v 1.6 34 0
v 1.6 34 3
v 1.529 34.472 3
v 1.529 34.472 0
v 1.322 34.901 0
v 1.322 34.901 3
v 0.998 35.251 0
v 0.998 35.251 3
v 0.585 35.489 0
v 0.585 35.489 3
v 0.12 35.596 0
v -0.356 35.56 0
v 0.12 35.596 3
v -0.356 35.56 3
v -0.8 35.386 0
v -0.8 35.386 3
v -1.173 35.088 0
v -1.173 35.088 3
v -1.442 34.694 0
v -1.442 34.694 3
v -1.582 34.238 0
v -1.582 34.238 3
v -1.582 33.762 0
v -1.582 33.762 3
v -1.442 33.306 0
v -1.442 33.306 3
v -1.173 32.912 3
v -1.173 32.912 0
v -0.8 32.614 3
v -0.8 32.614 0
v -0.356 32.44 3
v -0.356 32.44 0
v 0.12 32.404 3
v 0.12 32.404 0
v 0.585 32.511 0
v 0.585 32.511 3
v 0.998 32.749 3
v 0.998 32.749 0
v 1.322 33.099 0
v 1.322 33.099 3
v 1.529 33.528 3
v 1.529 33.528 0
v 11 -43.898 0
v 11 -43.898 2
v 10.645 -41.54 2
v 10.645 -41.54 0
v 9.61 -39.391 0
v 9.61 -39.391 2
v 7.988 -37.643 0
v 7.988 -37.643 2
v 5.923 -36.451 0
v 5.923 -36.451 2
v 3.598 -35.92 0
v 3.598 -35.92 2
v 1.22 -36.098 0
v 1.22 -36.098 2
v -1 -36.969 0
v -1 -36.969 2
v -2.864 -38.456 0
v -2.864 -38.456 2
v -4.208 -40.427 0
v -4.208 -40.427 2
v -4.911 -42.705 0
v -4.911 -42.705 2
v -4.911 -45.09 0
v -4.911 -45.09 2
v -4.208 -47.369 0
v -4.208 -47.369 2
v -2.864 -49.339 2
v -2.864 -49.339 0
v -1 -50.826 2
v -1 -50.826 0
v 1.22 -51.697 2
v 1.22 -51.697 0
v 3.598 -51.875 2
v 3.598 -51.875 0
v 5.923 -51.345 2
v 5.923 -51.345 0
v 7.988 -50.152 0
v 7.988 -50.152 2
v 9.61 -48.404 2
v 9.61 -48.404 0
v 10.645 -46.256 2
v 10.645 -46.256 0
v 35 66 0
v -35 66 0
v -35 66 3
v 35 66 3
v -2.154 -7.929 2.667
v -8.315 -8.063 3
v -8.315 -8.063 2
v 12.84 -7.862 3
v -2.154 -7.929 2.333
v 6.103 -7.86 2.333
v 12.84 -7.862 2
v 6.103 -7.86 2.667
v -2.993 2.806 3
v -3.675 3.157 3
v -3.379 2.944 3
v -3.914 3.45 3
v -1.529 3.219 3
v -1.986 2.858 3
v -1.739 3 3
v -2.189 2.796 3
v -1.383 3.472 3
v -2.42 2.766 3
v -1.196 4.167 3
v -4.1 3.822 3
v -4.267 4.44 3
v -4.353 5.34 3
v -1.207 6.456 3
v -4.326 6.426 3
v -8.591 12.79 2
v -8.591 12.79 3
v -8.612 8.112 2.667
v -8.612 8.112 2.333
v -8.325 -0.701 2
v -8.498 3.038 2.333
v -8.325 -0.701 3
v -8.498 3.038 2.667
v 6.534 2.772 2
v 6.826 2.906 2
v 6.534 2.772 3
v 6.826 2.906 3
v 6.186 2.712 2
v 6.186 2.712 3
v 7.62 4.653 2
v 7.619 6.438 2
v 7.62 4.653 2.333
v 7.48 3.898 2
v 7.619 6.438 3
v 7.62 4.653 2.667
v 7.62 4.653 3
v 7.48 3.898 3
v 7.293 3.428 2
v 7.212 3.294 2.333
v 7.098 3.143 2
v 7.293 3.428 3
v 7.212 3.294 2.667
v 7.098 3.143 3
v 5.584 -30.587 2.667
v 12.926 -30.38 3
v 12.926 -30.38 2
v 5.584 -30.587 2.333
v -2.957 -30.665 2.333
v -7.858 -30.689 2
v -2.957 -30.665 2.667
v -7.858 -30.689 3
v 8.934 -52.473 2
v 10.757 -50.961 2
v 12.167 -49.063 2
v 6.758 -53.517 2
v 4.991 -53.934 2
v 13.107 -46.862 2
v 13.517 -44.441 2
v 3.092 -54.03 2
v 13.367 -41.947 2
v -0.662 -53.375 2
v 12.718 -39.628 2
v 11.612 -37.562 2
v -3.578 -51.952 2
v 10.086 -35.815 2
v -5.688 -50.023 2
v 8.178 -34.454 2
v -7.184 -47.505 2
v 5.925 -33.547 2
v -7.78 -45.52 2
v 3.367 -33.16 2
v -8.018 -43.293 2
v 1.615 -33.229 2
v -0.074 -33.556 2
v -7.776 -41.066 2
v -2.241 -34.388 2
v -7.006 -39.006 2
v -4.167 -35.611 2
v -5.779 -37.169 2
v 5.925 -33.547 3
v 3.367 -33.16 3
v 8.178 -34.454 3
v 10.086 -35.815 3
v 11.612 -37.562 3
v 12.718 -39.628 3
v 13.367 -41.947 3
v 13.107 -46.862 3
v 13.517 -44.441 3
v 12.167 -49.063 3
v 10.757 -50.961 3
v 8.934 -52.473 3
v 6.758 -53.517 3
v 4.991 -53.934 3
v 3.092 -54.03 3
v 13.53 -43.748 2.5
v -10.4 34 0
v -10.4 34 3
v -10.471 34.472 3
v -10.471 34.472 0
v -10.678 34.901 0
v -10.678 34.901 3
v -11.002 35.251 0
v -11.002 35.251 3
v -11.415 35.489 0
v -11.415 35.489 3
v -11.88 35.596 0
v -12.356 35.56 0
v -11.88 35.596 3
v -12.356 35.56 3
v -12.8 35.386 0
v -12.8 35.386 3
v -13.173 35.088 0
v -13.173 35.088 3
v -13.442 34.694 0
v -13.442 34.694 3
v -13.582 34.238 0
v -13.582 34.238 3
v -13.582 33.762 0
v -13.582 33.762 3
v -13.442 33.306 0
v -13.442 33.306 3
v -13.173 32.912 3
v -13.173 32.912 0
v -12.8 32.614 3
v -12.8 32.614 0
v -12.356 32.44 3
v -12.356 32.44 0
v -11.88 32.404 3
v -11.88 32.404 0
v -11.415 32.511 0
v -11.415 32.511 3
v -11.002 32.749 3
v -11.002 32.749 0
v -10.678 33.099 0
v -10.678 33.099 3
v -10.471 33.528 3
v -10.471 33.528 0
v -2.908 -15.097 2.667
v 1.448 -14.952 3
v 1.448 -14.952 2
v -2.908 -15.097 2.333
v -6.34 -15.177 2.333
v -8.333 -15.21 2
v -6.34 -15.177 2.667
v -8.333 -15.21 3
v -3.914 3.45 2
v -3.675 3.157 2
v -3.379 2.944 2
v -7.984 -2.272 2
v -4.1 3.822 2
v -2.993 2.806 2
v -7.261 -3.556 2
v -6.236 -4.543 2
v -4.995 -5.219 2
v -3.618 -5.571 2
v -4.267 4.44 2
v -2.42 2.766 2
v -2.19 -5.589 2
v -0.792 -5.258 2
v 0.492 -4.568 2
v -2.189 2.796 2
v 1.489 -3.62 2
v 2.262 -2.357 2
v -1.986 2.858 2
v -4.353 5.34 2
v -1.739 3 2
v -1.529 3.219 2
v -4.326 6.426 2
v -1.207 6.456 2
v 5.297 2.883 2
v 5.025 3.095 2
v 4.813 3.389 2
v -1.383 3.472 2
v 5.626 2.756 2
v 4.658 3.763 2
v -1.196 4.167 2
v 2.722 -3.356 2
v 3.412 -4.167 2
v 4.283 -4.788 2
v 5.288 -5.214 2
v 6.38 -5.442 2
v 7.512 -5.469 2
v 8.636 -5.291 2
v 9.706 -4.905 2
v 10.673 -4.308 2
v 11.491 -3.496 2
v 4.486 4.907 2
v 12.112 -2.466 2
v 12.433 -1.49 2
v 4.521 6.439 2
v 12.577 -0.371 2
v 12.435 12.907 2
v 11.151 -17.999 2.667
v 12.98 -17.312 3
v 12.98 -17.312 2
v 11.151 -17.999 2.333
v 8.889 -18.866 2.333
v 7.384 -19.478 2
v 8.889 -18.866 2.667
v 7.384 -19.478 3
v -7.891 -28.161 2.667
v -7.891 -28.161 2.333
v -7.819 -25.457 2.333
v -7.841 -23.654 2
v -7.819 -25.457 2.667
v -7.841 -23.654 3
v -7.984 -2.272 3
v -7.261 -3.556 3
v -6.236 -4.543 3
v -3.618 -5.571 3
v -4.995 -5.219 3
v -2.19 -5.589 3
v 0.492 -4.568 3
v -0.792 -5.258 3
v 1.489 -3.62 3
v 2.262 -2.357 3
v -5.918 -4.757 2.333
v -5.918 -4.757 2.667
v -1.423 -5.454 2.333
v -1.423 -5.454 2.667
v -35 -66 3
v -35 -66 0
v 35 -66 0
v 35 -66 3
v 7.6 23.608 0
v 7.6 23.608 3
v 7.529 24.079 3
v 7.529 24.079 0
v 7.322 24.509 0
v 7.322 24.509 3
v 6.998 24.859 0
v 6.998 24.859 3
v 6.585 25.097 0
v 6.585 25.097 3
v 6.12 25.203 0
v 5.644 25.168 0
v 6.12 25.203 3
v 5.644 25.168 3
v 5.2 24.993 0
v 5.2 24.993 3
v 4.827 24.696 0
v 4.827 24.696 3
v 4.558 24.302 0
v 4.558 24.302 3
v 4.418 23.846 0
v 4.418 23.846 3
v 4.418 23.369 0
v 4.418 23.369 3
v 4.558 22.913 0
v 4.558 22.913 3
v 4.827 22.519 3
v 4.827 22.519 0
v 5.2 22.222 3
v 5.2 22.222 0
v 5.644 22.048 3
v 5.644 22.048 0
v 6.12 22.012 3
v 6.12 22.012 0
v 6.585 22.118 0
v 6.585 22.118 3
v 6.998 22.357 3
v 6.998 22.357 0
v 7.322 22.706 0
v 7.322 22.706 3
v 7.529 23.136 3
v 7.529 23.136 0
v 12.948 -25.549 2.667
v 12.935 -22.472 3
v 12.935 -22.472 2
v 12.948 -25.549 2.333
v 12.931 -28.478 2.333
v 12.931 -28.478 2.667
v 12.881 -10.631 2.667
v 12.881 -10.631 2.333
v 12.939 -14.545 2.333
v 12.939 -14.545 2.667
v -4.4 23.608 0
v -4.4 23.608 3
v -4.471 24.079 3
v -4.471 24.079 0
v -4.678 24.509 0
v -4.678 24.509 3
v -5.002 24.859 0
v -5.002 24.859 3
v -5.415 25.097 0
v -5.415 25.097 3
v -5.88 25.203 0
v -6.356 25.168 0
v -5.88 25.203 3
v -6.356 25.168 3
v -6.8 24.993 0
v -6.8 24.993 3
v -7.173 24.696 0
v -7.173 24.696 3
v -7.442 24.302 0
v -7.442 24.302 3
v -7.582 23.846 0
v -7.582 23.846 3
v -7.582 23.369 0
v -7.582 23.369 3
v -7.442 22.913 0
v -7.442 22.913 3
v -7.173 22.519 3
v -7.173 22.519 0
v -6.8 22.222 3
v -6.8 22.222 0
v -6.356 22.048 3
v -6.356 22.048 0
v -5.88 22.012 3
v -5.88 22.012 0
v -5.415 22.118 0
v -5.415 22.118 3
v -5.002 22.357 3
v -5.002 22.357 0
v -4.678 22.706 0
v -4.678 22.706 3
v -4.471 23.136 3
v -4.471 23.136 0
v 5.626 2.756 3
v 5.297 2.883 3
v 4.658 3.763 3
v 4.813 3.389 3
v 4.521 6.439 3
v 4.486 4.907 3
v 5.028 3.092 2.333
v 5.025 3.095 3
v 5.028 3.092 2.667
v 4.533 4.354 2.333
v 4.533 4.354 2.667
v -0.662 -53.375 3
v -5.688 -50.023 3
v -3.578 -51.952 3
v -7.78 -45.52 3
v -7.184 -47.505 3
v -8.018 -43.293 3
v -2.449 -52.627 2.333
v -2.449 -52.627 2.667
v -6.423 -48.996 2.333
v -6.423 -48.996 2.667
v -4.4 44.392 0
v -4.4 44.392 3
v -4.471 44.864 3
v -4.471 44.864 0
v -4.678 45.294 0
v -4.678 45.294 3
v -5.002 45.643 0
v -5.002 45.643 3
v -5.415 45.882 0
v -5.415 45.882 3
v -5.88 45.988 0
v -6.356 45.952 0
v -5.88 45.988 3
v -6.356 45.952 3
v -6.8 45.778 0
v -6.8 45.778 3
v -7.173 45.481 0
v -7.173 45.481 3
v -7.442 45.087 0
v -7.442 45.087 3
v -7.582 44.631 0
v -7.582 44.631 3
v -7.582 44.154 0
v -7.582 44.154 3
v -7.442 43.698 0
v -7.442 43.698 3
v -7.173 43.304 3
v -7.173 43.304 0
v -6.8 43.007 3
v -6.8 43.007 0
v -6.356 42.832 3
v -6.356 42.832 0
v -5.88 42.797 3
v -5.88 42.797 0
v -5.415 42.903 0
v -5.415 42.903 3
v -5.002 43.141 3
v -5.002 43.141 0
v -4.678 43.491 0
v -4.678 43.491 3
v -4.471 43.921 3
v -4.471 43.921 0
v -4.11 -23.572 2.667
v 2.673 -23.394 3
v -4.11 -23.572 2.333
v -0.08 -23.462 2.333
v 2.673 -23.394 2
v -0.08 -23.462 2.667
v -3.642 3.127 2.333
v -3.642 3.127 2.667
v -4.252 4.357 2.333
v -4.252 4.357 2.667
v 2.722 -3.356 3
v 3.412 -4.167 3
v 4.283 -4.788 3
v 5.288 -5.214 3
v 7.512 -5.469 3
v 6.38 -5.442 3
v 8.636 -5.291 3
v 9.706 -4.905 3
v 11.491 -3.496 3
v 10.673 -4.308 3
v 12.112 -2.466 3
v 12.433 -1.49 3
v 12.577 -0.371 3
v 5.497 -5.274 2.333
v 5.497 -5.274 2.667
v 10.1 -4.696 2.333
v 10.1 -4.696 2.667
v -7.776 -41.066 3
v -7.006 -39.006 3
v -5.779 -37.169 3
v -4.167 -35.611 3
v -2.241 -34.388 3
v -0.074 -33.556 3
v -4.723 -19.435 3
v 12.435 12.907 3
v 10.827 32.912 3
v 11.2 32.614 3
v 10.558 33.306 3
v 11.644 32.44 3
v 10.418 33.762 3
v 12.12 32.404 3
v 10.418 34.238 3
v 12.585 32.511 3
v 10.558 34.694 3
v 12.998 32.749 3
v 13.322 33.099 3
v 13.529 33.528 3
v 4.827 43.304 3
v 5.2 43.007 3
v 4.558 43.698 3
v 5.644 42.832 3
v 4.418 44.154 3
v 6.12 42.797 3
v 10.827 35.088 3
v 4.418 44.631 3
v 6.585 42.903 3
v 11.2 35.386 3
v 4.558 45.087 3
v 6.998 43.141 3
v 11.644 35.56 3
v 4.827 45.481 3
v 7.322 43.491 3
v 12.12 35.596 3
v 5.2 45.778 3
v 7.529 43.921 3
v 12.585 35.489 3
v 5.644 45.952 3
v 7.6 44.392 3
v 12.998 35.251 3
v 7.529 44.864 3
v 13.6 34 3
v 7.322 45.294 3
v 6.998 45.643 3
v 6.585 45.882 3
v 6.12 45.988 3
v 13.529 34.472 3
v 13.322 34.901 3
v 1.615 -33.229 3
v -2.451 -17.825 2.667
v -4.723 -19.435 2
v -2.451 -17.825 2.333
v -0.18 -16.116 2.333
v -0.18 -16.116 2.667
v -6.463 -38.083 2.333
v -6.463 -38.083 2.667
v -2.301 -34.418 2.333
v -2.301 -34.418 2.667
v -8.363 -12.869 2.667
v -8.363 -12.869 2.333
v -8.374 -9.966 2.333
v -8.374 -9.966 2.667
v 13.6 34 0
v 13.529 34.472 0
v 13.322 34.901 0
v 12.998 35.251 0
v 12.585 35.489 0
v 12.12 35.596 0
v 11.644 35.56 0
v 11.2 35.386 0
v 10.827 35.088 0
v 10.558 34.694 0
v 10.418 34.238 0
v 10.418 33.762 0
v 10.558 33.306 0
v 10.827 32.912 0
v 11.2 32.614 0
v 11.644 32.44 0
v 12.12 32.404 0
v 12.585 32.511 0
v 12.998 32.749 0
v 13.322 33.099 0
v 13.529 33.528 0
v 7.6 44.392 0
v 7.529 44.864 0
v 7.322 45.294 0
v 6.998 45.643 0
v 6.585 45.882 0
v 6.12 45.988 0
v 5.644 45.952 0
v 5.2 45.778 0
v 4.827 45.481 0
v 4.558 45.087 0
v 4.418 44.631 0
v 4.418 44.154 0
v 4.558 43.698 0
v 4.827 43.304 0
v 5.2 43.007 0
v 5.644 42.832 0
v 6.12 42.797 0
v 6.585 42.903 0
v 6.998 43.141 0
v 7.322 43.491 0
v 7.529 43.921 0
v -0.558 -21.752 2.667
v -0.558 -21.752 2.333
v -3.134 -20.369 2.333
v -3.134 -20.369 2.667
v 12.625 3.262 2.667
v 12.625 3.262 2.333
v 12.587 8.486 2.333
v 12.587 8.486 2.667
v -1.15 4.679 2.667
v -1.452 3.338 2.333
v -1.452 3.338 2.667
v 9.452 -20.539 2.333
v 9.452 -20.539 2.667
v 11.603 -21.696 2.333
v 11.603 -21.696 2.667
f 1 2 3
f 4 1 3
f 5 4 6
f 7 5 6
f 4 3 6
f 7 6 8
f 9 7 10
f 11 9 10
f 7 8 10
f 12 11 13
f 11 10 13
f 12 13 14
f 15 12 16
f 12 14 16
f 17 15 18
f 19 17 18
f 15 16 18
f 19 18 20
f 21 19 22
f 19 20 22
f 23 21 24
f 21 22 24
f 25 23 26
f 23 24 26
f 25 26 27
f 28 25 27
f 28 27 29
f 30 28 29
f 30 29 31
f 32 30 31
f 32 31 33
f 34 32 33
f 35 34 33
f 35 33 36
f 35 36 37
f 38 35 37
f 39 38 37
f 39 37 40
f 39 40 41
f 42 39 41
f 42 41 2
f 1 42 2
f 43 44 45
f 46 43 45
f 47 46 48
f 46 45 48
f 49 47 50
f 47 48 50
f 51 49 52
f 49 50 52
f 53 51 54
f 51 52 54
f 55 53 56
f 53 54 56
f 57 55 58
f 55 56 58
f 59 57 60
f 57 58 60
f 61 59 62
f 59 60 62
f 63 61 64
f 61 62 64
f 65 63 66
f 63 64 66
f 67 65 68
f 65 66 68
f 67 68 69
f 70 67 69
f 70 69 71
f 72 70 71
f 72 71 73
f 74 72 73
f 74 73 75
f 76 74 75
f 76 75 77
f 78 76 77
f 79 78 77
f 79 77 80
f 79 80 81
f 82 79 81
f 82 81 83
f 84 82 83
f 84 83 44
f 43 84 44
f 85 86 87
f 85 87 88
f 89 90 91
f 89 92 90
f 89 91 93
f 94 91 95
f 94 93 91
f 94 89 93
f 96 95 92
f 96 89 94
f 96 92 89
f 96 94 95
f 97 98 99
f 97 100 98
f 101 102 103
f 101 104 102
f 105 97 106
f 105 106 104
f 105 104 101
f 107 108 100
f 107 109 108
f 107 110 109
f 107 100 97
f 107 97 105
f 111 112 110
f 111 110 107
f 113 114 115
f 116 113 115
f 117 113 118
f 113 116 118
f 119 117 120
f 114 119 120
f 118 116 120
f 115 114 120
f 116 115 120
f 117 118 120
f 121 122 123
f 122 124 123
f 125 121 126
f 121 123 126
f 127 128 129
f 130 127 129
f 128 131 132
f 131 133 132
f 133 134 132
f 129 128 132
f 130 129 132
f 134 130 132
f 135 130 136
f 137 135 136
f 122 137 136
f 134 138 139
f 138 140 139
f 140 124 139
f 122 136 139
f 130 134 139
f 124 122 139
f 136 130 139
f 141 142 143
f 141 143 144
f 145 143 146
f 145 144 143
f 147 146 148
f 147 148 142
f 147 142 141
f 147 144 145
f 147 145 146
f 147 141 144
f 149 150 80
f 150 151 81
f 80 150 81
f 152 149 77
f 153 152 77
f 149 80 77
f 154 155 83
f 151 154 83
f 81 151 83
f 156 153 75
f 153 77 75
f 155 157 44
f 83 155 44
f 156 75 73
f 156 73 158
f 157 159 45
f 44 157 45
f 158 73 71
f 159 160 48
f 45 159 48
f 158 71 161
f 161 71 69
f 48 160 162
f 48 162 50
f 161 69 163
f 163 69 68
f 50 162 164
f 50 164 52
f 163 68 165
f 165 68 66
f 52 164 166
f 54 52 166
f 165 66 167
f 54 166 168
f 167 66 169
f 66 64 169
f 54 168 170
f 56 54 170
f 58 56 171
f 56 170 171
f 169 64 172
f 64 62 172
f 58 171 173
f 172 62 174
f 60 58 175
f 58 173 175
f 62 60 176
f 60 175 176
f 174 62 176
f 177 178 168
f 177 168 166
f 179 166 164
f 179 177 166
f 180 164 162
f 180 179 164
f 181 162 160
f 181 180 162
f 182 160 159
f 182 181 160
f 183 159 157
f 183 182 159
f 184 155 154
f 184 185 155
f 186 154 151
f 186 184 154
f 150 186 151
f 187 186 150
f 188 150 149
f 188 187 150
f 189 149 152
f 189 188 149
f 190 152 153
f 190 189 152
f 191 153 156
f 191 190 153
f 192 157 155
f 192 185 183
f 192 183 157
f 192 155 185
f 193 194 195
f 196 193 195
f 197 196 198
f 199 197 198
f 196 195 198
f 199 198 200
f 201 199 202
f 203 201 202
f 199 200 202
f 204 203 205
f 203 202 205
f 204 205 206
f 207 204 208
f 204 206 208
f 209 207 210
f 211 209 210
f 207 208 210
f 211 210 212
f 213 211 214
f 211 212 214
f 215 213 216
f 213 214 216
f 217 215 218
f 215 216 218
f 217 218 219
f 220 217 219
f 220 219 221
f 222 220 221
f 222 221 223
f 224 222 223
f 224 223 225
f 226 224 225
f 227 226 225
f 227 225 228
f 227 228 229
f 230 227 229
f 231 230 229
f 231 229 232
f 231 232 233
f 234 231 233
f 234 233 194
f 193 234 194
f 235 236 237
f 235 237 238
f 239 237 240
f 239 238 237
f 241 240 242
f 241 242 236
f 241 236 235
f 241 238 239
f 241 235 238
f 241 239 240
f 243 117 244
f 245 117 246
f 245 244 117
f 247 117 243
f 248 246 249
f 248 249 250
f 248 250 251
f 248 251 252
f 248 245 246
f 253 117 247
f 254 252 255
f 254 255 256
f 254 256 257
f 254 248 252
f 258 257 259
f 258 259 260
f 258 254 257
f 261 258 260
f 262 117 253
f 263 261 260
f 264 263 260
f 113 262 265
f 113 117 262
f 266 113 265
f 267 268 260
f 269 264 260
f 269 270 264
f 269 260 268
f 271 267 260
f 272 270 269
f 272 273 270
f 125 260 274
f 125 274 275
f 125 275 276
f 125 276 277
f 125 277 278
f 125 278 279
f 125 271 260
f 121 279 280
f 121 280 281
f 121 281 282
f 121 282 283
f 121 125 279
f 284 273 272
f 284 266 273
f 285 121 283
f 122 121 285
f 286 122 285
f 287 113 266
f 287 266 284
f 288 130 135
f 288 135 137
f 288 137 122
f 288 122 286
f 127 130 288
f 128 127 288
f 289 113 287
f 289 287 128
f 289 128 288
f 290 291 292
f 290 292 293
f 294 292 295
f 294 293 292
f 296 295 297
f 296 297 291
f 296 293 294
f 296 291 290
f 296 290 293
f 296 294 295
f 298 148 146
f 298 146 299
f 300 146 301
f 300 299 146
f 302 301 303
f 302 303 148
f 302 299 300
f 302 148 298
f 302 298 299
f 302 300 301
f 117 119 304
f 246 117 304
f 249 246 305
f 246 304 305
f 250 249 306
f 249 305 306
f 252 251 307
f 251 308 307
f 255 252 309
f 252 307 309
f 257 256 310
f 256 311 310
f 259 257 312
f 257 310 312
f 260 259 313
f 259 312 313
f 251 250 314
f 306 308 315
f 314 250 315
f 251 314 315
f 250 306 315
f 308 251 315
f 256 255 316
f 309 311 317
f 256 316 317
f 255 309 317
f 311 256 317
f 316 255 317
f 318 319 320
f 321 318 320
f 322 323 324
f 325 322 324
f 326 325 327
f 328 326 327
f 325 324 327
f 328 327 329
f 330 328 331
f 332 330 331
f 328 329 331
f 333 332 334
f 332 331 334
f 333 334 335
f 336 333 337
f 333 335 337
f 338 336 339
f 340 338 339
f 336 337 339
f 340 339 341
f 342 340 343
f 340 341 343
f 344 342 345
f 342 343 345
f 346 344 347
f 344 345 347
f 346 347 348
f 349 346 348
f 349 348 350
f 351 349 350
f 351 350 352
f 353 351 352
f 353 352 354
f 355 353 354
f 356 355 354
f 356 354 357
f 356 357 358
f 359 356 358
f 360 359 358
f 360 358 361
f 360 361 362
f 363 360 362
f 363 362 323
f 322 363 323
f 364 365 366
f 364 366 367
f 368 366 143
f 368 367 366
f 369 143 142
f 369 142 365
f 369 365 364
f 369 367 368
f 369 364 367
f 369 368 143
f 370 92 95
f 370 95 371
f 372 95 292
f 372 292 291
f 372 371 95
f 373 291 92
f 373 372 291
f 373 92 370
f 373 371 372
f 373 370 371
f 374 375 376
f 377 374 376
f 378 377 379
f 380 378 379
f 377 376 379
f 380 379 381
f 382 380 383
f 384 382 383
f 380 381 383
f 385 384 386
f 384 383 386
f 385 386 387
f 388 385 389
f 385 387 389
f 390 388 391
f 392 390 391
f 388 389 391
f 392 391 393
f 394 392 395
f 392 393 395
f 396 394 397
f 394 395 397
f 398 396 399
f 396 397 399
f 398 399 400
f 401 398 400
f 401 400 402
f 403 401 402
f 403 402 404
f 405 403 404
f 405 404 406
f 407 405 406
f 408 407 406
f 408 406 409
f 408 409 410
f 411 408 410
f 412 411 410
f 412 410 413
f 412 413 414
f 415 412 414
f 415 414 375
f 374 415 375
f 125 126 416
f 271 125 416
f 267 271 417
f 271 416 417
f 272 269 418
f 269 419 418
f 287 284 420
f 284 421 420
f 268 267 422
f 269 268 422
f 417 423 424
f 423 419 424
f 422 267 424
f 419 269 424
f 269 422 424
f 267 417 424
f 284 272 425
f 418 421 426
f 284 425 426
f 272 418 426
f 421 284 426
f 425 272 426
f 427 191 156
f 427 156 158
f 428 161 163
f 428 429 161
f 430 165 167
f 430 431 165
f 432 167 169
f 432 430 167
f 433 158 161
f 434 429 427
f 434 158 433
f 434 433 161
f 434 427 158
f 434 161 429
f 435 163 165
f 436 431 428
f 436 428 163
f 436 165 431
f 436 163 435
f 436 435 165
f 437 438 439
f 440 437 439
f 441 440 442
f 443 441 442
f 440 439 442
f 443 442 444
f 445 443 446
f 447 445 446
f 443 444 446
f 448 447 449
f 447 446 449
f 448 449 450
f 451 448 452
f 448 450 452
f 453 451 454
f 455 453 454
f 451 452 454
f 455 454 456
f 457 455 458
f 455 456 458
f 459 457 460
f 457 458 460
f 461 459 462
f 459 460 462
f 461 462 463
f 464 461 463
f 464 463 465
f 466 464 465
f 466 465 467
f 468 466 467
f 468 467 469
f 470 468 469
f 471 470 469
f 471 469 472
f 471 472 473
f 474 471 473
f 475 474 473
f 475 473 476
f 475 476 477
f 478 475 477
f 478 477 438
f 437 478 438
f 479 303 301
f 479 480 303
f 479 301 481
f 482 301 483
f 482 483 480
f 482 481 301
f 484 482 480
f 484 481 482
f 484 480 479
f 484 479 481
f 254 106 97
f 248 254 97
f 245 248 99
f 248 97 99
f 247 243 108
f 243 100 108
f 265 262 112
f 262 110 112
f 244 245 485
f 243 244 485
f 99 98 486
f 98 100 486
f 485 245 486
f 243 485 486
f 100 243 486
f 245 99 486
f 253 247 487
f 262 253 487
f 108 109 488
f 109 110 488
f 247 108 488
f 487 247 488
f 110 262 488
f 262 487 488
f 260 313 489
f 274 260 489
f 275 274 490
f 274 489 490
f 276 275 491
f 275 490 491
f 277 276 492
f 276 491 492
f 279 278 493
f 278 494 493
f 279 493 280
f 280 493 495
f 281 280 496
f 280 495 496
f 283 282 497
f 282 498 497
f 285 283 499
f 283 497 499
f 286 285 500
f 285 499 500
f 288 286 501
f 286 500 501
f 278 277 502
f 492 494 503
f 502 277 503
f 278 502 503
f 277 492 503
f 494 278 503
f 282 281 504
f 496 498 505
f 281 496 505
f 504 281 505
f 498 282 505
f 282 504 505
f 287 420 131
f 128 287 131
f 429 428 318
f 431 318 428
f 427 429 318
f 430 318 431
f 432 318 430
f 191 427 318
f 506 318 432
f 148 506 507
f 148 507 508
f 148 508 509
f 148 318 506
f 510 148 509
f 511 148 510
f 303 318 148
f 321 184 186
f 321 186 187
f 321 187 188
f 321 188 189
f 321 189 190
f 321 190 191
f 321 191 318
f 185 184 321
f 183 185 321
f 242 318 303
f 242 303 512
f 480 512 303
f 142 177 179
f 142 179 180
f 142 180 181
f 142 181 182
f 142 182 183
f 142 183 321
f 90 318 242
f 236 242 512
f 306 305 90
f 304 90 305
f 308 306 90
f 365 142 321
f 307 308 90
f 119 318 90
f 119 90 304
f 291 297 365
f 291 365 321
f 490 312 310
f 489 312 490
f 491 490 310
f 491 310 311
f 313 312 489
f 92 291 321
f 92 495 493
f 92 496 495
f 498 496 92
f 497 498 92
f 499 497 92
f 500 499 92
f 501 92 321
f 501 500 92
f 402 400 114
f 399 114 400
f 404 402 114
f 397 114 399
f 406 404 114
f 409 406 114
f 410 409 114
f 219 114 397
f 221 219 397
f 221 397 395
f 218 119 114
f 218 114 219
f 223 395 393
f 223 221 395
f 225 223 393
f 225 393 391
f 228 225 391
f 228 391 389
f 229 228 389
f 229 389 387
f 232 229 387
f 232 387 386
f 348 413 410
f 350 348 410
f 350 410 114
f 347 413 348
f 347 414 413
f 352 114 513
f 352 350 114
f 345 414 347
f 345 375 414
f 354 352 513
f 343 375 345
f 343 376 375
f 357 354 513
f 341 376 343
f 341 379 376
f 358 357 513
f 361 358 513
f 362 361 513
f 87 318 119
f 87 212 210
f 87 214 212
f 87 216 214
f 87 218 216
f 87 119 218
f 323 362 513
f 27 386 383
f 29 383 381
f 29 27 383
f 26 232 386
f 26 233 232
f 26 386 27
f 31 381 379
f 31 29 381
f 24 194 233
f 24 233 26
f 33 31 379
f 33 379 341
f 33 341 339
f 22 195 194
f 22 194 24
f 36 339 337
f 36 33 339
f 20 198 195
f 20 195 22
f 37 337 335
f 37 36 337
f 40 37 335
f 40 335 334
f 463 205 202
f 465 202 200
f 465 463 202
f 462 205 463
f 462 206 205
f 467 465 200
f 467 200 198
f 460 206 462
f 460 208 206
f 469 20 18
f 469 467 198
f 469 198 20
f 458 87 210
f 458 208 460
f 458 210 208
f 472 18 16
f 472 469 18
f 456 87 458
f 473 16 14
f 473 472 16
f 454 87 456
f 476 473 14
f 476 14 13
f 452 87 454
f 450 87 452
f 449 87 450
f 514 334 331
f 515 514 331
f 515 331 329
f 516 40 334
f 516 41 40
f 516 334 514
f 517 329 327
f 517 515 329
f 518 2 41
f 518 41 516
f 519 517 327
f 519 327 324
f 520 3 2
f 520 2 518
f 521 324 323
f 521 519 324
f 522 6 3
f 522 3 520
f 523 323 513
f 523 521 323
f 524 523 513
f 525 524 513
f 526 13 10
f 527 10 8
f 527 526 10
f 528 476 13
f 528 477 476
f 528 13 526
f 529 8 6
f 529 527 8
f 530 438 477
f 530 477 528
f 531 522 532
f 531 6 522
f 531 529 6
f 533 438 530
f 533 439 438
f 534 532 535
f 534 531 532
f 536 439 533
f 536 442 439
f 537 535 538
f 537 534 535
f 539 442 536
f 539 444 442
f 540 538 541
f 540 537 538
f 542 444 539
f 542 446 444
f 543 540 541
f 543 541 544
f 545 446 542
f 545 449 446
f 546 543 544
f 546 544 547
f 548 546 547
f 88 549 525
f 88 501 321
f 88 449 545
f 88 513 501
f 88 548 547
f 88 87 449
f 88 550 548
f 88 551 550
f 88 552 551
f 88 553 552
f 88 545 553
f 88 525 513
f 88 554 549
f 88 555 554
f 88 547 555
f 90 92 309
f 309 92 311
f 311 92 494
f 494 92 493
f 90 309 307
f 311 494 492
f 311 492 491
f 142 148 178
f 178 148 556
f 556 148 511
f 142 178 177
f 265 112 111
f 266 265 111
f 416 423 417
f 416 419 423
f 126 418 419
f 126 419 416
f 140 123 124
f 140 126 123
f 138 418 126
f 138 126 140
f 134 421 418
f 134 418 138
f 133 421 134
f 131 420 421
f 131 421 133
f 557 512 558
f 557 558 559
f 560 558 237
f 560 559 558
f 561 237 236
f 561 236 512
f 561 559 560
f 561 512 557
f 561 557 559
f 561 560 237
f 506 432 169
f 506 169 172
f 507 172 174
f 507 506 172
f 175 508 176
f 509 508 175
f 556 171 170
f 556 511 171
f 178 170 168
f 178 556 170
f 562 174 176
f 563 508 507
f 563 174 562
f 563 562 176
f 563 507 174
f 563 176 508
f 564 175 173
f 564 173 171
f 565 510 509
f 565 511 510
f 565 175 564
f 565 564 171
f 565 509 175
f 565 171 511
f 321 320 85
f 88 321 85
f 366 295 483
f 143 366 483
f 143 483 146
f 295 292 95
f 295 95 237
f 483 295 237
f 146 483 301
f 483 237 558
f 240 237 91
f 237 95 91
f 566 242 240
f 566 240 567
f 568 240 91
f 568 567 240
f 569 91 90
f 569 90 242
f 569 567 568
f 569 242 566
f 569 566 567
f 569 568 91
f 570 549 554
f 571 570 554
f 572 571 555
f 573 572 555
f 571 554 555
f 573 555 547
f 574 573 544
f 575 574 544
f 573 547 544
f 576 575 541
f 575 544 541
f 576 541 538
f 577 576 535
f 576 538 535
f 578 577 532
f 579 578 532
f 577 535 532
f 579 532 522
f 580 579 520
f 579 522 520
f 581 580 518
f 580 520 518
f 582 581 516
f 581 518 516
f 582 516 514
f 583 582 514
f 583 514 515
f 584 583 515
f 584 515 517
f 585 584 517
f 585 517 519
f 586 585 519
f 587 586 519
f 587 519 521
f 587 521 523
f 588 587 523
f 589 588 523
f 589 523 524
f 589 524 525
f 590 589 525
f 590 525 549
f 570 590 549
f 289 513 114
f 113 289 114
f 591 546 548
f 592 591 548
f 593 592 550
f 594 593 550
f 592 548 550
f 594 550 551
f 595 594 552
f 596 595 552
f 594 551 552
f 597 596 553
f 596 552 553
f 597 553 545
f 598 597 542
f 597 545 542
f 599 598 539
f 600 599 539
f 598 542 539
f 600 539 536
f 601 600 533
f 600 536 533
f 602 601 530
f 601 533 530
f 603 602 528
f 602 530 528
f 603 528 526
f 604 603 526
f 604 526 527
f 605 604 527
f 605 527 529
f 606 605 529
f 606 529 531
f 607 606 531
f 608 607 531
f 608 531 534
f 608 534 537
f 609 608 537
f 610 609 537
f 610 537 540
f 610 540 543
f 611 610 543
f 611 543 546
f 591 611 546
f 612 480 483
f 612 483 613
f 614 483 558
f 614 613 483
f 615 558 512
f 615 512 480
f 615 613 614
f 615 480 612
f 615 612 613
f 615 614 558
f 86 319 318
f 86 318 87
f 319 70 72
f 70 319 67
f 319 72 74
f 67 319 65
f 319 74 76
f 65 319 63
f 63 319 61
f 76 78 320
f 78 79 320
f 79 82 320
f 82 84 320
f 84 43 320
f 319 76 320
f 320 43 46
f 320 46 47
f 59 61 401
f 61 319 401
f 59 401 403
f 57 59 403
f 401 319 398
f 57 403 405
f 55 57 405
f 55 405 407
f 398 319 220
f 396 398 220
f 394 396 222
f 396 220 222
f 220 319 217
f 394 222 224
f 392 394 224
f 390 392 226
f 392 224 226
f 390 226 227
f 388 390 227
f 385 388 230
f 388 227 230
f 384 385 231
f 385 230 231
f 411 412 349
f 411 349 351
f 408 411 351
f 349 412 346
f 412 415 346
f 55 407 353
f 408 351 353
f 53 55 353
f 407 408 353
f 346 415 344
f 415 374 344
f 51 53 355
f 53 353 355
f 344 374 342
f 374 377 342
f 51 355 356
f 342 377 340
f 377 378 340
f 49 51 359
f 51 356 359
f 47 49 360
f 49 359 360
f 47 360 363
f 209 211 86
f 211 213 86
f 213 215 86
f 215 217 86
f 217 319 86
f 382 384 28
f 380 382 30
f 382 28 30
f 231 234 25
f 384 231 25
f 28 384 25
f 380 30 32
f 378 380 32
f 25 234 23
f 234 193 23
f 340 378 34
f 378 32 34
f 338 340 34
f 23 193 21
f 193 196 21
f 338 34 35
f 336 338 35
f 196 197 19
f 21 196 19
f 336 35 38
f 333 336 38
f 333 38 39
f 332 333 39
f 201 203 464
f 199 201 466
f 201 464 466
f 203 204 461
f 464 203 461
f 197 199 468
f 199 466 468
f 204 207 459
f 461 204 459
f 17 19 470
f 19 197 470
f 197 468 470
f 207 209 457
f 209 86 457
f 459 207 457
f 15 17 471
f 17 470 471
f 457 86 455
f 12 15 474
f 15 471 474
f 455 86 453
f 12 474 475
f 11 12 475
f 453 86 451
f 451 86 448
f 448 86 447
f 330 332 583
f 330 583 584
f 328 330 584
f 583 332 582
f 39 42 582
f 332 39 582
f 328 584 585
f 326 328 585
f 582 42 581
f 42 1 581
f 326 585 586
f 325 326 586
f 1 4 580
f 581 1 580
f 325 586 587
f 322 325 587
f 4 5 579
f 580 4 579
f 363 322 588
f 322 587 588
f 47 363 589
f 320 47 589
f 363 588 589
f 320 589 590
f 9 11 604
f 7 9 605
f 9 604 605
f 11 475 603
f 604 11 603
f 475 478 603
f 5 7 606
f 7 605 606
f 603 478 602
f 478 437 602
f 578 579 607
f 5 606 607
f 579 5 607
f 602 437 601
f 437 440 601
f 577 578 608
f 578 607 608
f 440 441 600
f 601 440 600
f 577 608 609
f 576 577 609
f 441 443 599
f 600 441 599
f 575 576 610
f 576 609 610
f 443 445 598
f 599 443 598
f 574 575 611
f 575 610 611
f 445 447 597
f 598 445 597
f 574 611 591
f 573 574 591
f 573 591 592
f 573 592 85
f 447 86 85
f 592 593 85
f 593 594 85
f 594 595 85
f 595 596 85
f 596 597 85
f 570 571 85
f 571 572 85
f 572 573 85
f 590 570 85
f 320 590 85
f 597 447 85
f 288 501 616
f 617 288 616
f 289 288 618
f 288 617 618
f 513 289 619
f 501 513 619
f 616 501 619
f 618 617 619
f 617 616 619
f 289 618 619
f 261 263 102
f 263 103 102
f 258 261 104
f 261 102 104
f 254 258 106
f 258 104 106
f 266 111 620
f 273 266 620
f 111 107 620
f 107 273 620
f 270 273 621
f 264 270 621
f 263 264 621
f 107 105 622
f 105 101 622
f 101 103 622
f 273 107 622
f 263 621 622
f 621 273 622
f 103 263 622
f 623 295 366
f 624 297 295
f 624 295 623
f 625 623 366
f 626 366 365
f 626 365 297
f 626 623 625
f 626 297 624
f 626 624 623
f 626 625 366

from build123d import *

# Parameters (mm, degrees)
SKETCH1_W           = 70
SKETCH1_H           = 132
BOSS_EXTRUDE1_DEPTH = 3
SKETCH2_R           = 1.6
SKETCH2_R_2         = 8
CUT_EXTRUDE1_DEPTH  = 75.76630257
CUT_EXTRUDE4_DEPTH  = 1


with BuildPart() as part:
    # Sketch1 → Boss-Extrude1 (new body)
    with BuildSketch(Plane.XY):
        Rectangle(SKETCH1_W, SKETCH1_H)
    extrude(amount=BOSS_EXTRUDE1_DEPTH)

    # Sketch2 → Cut-Extrude1 (cut, through all)
    with BuildSketch(Plane.XY.offset(3)):
        with Locations((0, 34)):
            Circle(SKETCH2_R)
        with Locations((12, 34)):
            Circle(SKETCH2_R)
        with Locations((6, 23.607695155)):
            Circle(SKETCH2_R)
        with Locations((-6, 23.607695155)):
            Circle(SKETCH2_R)
        with Locations((-12, 34)):
            Circle(SKETCH2_R)
        with Locations((-6, 44.392304845)):
            Circle(SKETCH2_R)
        with Locations((6, 44.392304845)):
            Circle(SKETCH2_R)
        with Locations((3, -43.897608135)):
            Circle(SKETCH2_R_2)
    extrude(amount=-CUT_EXTRUDE1_DEPTH, mode=Mode.SUBTRACT)

    # Sketch4 → Cut-Extrude4 (cut)
    # profile 1 of 3: a face of its own
    with BuildSketch(Plane.XY.offset(3)):
        with BuildLine():
            Line((12.435373561, 12.906743281), (-8.591322356, 12.79048604))
            add(Edge.make_bspline(
                [(-8.591322356, 12.79048604), (-8.704286114, 8.885776406), (-8.502594221, 1.79384743), (-8.325007333, -0.700797834)],
                knots=[3, 3, 3, 3, 4, 4, 4, 4], degree=3))
            add(Edge.make_bspline(
                [(-8.325007333, -0.700797834), (-7.927810309, -6.293112042), (-0.051557809, -7.493806409), (2.262018013, -2.357422472)],
                knots=[4, 4, 4, 4, 5, 5, 5, 5], degree=3))
            add(Edge.make_bspline(
                [(2.262018013, -2.357422472), (3.647515819, -6.937264415), (12.328667278, -6.654110228), (12.577245481, -0.371389262)],
                knots=[0, 0, 0, 0, 1, 1, 1, 1], degree=3))
            add(Edge.make_bspline(
                [(12.577245481, -0.371389262), (12.657220975, 1.669518266), (12.654067782, 9.68502366), (12.435373561, 12.906743281)],
                knots=[1, 1, 1, 1, 2, 2, 2, 2], degree=3))
        make_face()
        with BuildLine():
            Line((-4.326492155, 6.425883244), (-1.206711683, 6.455631236))
            add(Edge.make_bspline(
                [(-1.206711683, 6.455631236), (-1.074026475, 4.572236089), (-1.015280968, 2.842101206), (-2.419907538, 2.766134029)],
                knots=[1, 1, 1, 1, 2, 2, 2, 2], degree=3))
            add(Edge.make_bspline(
                [(-2.419907538, 2.766134029), (-3.973264085, 2.682447476), (-4.493703991, 3.948173451), (-4.326492155, 6.425883244)],
                knots=[2, 2, 2, 2, 3, 3, 3, 3], degree=3))
        make_face(mode=Mode.SUBTRACT)
        with BuildLine():
            Line((4.521297604, 6.43862815), (7.619481633, 6.437735553))
            add(Edge.make_bspline(
                [(7.619481633, 6.437735553), (7.754881729, 4.557137064), (7.590941128, 2.787865388), (6.186314558, 2.711898211)],
                knots=[1, 1, 1, 1, 2, 2, 2, 2], degree=3))
            add(Edge.make_bspline(
                [(6.186314558, 2.711898211), (4.635672899, 2.631008317), (4.351289109, 3.963633245), (4.521297604, 6.43862815)],
                knots=[2, 2, 2, 2, 3, 3, 3, 3], degree=3))
        make_face(mode=Mode.SUBTRACT)
    # profile 2 of 3: a face of its own
    with BuildSketch(Plane.XY.offset(3)):
        with BuildLine():
            add(Edge.make_bspline(
                [(3.36676789, -33.160113435), (9.417717715, -33.392835626), (13.445086014, -38.057518842), (13.529515019, -43.748190308), (13.613984909, -49.441617546), (9.14299869, -54.262705816), (3.092048865, -54.029983625)],
                knots=[2, 2, 2, 2, 3, 3, 3, 4, 4, 4, 4], degree=3))
            add(Edge.make_bspline(
                [(3.092048865, -54.029983625), (-2.961697619, -53.794546546), (-7.883326898, -49.978313982), (-8.018340697, -43.29333994)],
                knots=[0, 0, 0, 0, 1, 1, 1, 1], degree=3))
            add(Edge.make_bspline(
                [(-8.018340697, -43.29333994), (-8.133164977, -37.597606671), (-2.686937708, -32.927432129), (3.36676789, -33.160113435)],
                knots=[1, 1, 1, 1, 2, 2, 2, 2], degree=3))
        make_face()
    # profile 3 of 3: a face of its own
    with BuildSketch(Plane.XY.offset(3)):
        with BuildLine():
            add(Edge.make_bspline(
                [(-8.315009416, -8.062939687), (-4.406161921, -7.897447705), (8.068102589, -7.822629876), (12.839981265, -7.862087625)],
                knots=[11, 11, 11, 11, 12, 12, 12, 12], degree=3))
            add(Edge.make_bspline(
                [(12.839981265, -7.862087625), (12.861241838, -9.29508964), (12.9589587, -15.881387365), (12.980178387, -17.311633608)],
                knots=[0, 0, 0, 0, 1, 1, 1, 1], degree=3))
            add(Edge.make_bspline(
                [(12.980178387, -17.311633608), (11.763075071, -17.765199017), (8.114684439, -19.13687745), (7.383799305, -19.47848671)],
                knots=[1, 1, 1, 1, 2, 2, 2, 2], degree=3))
            add(Edge.make_bspline(
                [(7.383799305, -19.47848671), (9.108176948, -20.332188301), (12.314465086, -22.045945199), (12.935462432, -22.472239835)],
                knots=[2, 2, 2, 2, 3, 3, 3, 3], degree=3))
            add(Edge.make_bspline(
                [(12.935462432, -22.472239835), (12.97786092, -25.329976547), (12.909725475, -29.283635925), (12.92599799, -30.380433621)],
                knots=[3, 3, 3, 3, 4, 4, 4, 4], degree=3))
            add(Edge.make_bspline(
                [(12.92599799, -30.380433621), (7.795263549, -30.67706556), (-6.389215715, -30.667001608), (-7.858042781, -30.688793695)],
                knots=[4, 4, 4, 4, 5, 5, 5, 5], degree=3))
            add(Edge.make_bspline(
                [(-7.858042781, -30.688793695), (-8.0102064, -28.607228198), (-7.705115353, -24.647296875), (-7.841129113, -23.654261755)],
                knots=[5, 5, 5, 5, 6, 6, 6, 6], degree=3))
            add(Edge.make_bspline(
                [(-7.841129113, -23.654261755), (-4.784976738, -23.608919496), (1.083266322, -23.417113542), (2.673347405, -23.393522483)],
                knots=[6, 6, 6, 6, 7, 7, 7, 7], degree=3))
            add(Edge.make_bspline(
                [(2.673347405, -23.393522483), (-0.775407881, -21.686119301), (-3.737511671, -20.081751157), (-4.722867923, -19.434839155)],
                knots=[7, 7, 7, 7, 8, 8, 8, 8], degree=3))
            add(Edge.make_bspline(
                [(-4.722867923, -19.434839155), (-2.664517487, -18.089507553), (0.355778115, -15.627352279), (1.448315671, -14.952368219)],
                knots=[8, 8, 8, 8, 9, 9, 9, 9], degree=3))
            add(Edge.make_bspline(
                [(1.448315671, -14.952368219), (-3.198997245, -15.134329121), (-7.2306933, -15.194144924), (-8.333002543, -15.21049921)],
                knots=[9, 9, 9, 9, 10, 10, 10, 10], degree=3))
            add(Edge.make_bspline(
                [(-8.333002543, -15.21049921), (-8.355857659, -13.670022044), (-8.425935777, -8.946626939), (-8.315009416, -8.062939687)],
                knots=[10, 10, 10, 10, 11, 11, 11, 11], degree=3))
        make_face()
    extrude(amount=-CUT_EXTRUDE4_DEPTH, mode=Mode.SUBTRACT)


solid = part.part
